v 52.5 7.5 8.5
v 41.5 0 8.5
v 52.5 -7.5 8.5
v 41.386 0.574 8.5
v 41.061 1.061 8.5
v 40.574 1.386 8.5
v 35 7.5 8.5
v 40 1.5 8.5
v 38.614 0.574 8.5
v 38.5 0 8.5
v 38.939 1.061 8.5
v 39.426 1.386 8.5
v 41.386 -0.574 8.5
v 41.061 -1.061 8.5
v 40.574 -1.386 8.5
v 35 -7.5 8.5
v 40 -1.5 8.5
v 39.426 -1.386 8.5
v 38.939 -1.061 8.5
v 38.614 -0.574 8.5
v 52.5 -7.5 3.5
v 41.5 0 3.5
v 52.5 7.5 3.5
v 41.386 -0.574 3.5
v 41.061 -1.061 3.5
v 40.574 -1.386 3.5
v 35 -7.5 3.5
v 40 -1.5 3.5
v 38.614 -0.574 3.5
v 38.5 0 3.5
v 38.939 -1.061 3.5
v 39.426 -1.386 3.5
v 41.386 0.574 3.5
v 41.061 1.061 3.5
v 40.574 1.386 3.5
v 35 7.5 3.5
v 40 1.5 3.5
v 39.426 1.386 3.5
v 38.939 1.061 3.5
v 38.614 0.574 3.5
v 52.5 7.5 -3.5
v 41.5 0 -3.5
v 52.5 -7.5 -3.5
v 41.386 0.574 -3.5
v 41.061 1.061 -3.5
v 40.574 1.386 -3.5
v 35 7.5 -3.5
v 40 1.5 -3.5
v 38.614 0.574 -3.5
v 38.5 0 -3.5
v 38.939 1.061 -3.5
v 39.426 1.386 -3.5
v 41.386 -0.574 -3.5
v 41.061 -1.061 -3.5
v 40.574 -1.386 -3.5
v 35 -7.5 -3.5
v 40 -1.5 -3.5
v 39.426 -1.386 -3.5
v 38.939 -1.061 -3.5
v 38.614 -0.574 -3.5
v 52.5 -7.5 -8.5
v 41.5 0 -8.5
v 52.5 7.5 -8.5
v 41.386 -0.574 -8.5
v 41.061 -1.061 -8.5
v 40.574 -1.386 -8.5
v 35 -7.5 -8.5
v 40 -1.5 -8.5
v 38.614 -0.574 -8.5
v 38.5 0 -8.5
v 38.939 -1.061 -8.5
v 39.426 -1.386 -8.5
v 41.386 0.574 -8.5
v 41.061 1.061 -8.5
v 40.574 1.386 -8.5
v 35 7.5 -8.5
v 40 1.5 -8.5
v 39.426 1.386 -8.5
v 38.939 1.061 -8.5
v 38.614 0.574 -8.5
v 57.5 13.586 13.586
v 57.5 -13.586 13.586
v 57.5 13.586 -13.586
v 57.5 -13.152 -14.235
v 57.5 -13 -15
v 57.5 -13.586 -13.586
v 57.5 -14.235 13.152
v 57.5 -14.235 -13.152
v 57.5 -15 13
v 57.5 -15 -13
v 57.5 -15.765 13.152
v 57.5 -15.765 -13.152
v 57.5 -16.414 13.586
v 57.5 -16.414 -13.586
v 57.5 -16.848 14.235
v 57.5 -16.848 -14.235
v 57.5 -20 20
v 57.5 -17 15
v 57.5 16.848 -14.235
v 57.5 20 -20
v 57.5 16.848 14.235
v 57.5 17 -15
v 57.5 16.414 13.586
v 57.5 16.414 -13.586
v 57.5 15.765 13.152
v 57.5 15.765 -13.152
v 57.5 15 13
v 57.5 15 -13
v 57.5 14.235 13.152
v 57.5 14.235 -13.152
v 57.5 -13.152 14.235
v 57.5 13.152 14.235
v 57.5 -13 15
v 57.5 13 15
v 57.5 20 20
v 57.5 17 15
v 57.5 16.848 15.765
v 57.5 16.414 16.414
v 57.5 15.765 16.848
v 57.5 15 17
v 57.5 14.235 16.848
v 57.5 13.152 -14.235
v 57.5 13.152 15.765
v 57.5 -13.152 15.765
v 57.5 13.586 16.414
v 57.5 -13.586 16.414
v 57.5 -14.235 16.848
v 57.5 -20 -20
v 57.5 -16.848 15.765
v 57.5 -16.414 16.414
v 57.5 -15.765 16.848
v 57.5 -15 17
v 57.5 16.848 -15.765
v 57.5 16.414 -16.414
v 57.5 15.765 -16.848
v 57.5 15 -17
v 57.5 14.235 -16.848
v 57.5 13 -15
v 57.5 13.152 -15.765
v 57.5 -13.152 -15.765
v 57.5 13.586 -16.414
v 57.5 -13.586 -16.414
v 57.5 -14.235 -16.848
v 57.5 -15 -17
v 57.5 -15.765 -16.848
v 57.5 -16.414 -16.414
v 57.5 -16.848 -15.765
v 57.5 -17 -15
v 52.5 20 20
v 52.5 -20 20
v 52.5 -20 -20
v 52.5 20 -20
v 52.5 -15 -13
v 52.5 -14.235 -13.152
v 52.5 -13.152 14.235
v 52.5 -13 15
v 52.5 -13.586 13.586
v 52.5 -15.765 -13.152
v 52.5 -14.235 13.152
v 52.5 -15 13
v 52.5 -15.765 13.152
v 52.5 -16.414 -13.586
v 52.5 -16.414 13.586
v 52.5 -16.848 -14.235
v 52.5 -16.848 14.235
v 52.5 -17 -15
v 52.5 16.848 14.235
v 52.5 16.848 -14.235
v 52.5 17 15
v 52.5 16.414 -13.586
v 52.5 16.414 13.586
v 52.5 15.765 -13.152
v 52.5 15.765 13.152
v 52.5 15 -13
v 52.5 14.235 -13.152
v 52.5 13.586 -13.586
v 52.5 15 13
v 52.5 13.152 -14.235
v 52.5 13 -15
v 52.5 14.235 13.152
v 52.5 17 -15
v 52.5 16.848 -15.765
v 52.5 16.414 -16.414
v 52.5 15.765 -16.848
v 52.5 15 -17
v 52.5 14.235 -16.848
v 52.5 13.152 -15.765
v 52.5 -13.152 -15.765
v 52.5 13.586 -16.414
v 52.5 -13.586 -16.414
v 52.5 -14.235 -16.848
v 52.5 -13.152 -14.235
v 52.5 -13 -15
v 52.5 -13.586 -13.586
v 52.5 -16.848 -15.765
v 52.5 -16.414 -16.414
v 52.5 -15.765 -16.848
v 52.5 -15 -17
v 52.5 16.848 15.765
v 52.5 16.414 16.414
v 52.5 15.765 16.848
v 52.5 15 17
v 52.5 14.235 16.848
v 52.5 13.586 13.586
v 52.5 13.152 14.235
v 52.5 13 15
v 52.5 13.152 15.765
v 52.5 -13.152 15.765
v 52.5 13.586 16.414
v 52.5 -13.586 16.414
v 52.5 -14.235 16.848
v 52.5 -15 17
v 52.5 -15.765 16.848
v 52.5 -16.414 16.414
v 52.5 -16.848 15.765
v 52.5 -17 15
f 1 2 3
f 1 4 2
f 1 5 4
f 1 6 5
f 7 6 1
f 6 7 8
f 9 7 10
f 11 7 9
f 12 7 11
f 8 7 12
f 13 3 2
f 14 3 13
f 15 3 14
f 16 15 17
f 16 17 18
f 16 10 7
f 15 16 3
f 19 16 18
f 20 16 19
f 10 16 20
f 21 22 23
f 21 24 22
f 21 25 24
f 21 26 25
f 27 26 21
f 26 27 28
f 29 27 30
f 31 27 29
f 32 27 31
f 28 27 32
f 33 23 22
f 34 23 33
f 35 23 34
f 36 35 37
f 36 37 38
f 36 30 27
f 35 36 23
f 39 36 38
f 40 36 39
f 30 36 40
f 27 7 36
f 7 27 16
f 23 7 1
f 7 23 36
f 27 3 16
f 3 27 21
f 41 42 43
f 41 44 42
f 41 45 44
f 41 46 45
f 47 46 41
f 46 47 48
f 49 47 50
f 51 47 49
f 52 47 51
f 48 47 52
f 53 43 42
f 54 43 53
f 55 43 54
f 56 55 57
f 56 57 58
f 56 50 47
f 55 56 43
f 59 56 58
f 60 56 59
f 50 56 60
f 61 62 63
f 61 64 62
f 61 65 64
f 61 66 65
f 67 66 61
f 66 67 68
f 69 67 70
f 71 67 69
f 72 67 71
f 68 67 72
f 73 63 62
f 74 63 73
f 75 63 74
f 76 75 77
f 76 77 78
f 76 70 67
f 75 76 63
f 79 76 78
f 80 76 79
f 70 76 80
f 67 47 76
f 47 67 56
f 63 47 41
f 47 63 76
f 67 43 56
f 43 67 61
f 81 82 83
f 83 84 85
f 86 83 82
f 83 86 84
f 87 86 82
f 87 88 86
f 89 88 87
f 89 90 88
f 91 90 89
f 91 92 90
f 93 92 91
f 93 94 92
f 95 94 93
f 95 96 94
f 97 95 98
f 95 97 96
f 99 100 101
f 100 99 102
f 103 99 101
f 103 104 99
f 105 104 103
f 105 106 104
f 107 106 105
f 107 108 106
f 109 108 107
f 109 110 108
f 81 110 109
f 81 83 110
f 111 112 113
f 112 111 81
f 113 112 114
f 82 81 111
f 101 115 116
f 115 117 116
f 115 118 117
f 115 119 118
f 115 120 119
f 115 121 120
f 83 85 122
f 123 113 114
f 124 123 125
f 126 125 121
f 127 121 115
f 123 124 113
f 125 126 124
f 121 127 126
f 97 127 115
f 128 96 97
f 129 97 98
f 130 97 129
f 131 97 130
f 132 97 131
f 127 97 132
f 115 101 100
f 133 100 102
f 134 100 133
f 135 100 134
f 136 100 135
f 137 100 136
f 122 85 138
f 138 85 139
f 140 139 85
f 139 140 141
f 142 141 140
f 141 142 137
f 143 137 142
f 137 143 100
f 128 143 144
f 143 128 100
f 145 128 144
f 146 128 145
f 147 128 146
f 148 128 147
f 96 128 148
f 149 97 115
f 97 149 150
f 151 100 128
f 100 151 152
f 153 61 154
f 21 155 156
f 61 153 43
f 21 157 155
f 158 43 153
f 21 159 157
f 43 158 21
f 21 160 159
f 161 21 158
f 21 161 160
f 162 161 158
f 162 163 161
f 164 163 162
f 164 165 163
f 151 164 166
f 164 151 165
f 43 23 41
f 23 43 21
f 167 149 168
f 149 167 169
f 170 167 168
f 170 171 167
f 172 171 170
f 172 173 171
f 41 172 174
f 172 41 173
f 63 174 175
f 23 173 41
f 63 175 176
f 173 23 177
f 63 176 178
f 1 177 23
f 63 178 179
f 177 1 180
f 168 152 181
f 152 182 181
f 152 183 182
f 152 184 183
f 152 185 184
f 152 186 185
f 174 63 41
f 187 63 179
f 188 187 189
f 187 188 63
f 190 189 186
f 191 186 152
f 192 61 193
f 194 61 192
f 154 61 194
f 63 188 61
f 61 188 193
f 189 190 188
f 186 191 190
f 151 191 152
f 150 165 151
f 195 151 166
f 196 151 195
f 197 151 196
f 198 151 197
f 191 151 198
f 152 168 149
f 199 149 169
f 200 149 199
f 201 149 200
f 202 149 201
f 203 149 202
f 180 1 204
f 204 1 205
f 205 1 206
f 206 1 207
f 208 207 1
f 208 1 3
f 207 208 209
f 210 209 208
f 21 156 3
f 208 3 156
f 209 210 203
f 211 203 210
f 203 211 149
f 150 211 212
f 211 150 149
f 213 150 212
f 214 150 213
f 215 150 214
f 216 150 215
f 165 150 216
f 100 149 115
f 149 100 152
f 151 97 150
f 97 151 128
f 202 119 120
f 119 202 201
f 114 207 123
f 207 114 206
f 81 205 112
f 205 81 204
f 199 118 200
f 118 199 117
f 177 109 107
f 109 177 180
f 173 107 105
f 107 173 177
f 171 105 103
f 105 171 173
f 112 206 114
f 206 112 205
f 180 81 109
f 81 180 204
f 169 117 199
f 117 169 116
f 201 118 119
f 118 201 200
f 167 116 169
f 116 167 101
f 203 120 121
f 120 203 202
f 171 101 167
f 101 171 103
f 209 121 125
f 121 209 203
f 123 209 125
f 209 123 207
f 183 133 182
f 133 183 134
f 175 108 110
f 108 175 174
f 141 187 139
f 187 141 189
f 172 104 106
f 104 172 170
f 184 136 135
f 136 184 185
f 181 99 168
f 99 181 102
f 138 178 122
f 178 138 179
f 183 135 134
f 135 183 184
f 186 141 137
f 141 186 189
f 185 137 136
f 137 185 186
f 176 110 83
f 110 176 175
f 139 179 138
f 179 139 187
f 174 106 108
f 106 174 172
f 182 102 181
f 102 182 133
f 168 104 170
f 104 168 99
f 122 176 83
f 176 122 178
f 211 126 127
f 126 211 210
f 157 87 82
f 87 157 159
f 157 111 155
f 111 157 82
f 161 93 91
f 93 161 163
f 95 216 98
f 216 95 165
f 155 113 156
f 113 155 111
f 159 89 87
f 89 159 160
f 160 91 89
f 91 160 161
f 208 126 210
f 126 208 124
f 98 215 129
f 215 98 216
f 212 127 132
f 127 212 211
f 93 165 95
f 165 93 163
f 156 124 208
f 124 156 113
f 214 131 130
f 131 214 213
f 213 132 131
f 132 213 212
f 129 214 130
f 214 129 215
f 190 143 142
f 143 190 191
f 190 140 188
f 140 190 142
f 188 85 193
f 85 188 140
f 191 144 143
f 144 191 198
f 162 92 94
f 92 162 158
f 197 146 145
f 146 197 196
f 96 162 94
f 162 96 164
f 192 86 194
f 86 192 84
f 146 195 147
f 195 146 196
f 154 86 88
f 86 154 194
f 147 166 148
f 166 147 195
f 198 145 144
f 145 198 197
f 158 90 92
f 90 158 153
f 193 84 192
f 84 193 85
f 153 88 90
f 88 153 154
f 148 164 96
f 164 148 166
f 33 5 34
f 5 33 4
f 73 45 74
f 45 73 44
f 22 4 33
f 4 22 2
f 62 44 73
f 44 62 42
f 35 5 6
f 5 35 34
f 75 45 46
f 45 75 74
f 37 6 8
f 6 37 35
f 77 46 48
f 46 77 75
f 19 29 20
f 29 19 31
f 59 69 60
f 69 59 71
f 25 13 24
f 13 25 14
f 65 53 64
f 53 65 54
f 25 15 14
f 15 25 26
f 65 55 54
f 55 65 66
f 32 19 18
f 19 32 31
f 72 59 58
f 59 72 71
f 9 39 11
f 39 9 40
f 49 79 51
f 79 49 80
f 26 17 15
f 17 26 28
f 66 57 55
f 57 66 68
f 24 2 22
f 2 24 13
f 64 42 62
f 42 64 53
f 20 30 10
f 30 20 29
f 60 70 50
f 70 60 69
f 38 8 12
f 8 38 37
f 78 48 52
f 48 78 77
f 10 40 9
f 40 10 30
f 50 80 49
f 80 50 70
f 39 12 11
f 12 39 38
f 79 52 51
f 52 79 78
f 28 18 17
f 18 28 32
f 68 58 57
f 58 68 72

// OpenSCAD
$fn=16;
/*
difference(){

    union(){
        hull(){
            rotate([90,0,0])cylinder(r=6/2,h=2*4+7,center=true);
            translate([10+30,0,0])rotate([0,0,0])cylinder(r=(2*4+7)/2,h=6,center=true);
            //rotate([90,0,0])cylinder(r=3.5/2,h=7+2*4+2,center=true);
        }


    }
    rotate([90,0,0])cylinder(r=3.5/2,h=2*4+7+5,center=true);
    rotate([90,0,0])cylinder(r=7/2,h=7.5,center=true);
    translate([10,0,-25])cylinder(r=3.5/2,h=2*4+7+20,center=true);
    translate([40,0,-10])cylinder(r=3/2,h=20);
}
*/
difference(){
union(){
translate([45,0,6])cube([20,15,5],center=true);
translate([45,0,-6])cube([20,15,5],center=true);
translate([55,0,0])cube([5,40,40],center=true);
}
translate([50,30/2,30/2])rotate([0,90,0])cylinder(r=4/2,h=20,center=true);
translate([50,30/2,-30/2])rotate([0,90,0])cylinder(r=4/2,h=20,center=true);
translate([50,-30/2,30/2])rotate([0,90,0])cylinder(r=4/2,h=20,center=true);
translate([50,-30/2,-30/2])rotate([0,90,0])cylinder(r=4/2,h=20,center=true);
translate([40,0,-10])cylinder(r=3/2,h=20);
}
